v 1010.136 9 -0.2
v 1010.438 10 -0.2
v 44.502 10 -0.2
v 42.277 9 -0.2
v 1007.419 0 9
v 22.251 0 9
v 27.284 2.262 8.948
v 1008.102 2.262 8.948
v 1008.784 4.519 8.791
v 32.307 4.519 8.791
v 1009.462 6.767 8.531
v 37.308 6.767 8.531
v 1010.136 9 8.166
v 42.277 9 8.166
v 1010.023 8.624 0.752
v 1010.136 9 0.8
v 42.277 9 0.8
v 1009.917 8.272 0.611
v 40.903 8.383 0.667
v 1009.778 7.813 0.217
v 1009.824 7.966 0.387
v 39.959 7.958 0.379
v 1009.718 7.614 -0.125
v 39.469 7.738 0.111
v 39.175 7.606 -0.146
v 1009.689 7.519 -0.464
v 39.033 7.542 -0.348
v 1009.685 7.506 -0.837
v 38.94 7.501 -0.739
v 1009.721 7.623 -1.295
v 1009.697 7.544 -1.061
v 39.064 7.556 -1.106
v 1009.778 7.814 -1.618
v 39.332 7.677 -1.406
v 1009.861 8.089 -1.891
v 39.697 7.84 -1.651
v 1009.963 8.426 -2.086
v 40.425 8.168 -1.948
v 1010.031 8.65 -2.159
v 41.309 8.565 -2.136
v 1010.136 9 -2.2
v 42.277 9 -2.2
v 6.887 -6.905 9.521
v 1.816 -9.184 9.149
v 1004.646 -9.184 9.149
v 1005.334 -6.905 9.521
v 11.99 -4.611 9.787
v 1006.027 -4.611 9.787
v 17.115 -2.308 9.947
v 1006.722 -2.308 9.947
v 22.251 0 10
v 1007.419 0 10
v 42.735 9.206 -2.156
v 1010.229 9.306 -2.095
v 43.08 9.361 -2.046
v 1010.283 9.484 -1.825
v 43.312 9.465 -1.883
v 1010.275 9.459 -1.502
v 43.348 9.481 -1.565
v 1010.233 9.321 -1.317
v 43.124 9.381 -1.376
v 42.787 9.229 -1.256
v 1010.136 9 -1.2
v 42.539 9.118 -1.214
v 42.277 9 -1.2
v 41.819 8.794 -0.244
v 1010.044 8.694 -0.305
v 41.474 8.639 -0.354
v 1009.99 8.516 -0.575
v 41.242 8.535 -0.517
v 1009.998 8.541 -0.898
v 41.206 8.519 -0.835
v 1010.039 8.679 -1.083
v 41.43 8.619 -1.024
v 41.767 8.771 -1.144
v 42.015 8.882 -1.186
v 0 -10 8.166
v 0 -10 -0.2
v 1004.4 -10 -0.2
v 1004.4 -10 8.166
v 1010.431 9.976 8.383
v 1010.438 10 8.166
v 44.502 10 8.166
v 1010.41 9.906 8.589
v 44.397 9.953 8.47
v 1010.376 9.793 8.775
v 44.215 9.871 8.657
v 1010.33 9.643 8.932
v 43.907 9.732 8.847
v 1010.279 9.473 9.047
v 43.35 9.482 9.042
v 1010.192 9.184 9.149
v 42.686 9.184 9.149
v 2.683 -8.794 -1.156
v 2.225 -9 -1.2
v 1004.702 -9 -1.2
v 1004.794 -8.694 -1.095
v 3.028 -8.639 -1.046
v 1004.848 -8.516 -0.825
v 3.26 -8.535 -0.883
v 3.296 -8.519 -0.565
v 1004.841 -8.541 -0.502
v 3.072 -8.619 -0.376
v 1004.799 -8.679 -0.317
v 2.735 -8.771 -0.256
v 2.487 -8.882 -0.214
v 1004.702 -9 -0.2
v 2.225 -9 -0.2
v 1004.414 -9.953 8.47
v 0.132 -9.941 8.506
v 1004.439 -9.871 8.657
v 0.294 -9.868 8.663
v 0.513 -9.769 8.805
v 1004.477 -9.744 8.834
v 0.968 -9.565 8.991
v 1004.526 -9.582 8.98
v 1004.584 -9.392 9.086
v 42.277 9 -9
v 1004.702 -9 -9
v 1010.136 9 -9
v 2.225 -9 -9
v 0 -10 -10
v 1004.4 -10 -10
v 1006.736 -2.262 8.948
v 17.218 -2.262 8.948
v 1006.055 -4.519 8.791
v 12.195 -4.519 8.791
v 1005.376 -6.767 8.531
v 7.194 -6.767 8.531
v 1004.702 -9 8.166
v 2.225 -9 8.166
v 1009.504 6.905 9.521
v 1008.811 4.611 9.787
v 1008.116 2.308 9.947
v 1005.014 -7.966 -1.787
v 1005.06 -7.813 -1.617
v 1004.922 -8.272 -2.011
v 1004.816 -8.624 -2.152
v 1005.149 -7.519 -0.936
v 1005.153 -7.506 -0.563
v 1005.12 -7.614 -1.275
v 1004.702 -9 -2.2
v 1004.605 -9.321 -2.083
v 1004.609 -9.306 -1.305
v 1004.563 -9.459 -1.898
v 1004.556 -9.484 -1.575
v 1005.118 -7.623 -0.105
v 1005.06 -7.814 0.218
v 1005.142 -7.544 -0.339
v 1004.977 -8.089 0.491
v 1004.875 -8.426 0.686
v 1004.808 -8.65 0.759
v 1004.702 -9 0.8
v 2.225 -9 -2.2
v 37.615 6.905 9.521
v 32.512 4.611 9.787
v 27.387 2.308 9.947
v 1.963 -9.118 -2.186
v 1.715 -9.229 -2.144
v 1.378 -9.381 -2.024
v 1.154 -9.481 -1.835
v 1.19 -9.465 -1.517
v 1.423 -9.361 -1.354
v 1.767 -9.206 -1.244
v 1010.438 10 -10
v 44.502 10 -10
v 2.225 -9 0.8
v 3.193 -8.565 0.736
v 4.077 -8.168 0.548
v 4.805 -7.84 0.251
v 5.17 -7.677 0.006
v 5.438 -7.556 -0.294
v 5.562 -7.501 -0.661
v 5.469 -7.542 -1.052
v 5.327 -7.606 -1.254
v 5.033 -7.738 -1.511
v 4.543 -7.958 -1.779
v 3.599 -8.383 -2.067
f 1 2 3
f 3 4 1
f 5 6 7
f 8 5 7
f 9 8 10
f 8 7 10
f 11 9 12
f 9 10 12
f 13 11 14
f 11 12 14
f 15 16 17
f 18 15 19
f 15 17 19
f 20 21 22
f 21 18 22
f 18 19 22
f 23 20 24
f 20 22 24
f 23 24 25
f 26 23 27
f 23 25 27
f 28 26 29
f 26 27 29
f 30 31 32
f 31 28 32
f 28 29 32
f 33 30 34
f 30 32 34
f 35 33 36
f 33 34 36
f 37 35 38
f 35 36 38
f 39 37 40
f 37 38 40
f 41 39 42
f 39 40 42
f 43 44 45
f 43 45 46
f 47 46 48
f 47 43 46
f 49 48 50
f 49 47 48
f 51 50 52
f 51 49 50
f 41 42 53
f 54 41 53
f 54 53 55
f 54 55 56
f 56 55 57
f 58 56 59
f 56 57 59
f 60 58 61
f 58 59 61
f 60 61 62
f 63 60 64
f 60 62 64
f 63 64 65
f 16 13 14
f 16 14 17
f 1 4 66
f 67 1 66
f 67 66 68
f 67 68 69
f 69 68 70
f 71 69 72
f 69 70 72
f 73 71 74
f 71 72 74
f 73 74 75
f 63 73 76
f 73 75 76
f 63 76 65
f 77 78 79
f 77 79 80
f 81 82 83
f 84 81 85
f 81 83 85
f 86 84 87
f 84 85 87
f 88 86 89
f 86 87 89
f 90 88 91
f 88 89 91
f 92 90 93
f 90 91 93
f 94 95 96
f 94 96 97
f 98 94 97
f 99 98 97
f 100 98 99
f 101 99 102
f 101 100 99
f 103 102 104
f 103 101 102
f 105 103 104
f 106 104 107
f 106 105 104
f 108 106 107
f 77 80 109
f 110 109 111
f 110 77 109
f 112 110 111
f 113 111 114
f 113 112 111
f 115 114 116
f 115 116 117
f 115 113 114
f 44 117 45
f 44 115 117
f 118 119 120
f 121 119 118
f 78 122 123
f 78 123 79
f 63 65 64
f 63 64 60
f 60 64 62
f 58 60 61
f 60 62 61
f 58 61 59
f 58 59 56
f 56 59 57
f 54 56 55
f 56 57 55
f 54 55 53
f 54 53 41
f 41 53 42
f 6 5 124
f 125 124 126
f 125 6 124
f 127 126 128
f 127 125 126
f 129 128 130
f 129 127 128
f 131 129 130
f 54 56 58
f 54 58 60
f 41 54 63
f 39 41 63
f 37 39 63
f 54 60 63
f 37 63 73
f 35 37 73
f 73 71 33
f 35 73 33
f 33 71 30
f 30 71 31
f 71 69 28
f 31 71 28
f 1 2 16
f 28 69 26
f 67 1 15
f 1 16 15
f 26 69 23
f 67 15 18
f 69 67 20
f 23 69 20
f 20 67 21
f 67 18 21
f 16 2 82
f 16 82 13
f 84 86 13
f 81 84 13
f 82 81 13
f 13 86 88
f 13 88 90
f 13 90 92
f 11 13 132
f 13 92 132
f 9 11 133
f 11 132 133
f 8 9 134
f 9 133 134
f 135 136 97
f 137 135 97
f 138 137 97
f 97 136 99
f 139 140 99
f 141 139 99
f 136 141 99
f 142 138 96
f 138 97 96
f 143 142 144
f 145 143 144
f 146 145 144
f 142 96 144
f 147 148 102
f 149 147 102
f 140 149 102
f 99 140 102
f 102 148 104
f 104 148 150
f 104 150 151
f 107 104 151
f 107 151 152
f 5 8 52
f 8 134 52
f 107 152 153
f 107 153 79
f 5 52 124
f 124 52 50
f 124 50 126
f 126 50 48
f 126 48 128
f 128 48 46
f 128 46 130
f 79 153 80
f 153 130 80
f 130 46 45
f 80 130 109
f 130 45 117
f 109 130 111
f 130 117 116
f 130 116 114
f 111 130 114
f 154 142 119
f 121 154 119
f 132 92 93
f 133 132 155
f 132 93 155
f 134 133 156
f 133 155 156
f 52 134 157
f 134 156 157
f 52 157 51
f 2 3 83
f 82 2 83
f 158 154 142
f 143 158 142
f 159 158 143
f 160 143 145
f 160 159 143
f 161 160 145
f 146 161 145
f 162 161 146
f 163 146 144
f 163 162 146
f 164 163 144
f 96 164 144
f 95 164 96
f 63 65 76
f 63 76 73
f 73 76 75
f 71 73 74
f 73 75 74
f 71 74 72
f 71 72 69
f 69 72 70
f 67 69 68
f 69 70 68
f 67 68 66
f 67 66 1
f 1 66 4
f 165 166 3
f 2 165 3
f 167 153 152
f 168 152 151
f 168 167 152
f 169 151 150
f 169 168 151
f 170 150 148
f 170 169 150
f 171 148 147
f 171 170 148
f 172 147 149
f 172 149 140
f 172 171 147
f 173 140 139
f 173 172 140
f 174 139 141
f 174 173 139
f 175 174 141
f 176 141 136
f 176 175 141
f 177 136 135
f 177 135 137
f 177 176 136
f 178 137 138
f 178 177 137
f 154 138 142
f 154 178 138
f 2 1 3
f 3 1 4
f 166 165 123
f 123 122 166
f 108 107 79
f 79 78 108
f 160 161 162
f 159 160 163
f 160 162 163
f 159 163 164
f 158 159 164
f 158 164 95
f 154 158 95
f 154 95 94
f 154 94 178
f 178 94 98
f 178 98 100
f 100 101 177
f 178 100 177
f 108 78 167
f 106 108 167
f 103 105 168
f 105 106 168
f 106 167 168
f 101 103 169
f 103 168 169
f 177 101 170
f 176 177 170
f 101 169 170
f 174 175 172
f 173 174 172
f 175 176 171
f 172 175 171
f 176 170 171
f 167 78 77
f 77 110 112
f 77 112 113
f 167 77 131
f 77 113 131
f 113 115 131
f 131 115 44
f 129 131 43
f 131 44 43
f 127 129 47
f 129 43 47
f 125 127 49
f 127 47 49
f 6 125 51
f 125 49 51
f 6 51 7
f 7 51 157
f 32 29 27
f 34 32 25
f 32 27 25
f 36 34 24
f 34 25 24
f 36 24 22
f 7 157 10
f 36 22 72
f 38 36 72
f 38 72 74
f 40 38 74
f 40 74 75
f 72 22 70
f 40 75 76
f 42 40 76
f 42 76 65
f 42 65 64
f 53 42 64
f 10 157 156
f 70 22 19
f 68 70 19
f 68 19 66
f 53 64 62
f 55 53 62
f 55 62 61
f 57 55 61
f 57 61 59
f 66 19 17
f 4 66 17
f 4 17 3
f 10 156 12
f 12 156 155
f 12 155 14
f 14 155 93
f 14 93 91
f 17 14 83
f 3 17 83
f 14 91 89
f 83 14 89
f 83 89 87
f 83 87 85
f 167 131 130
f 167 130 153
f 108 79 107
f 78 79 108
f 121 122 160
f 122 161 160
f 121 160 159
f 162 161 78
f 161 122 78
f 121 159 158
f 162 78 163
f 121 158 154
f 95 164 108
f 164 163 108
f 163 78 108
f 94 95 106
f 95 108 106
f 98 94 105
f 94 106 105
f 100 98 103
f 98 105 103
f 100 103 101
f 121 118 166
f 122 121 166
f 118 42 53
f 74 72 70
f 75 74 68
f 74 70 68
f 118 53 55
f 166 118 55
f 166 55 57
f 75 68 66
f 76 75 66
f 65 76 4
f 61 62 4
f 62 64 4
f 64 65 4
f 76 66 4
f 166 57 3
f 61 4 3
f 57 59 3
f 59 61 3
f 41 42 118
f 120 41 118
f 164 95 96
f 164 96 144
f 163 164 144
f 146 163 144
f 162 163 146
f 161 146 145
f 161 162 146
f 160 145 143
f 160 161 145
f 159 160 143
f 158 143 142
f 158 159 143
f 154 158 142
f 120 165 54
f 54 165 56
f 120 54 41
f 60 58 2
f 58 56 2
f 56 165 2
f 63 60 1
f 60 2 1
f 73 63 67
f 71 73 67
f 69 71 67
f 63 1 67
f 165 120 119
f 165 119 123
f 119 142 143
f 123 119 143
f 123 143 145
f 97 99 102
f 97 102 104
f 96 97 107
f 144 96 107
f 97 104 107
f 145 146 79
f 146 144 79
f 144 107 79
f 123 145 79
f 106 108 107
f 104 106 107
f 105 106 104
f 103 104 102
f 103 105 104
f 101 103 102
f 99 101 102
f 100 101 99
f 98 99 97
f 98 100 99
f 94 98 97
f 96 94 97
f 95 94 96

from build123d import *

# Parameters (mm, degrees)
F2_DEPTH      = 1200
F4_DEPTH      = 1200
F8_DEPTH      = 10.001
F8_DEPTH_BACK = 10.001


with BuildPart() as f2:
    # F1 (on Right) → F2 (new body)
    with BuildSketch(Plane.YZ):
        with BuildLine():
            Line((0, -9), (0, -10))
            Line((0, -10), (10, -10))
            Line((10, -10), (10, -0.2))
            Line((10, -0.2), (9, -0.2))
            ThreePointArc((9, -0.2), (8.5, -0.7), (9, -1.2))
            ThreePointArc((9, -1.2), (9.5, -1.7), (9, -2.2))
            Line((9, -2.2), (9, -9))
            Line((9, -9), (0, -9))
        make_face()
    extrude(amount=F2_DEPTH)

    # F5: F2 across plane


with BuildPart() as f4:
    # F3 (on Right) → F4 (new body)
    with BuildSketch(Plane.YZ):
        with BuildLine():
            Line((9, -0.2), (10, -0.2))
            Line((10, -0.2), (10, 8.1663783152))
            ThreePointArc((10, 8.1663783152), (9.7693092582, 8.8052548802), (9.1836734694, 9.1493656277))
            ThreePointArc((9.1836734694, 9.1493656277), (4.6114920912, 9.7868872364), (0, 10))
            Line((0, 10), (0, 9))
            ThreePointArc((0, 9), (4.5192622493, 8.7911494917), (9, 8.1663783152))
            Line((9, 8.1663783152), (9, 0.8))
            ThreePointArc((9, 0.8), (7.5, -0.7), (9, -2.2))
            ThreePointArc((9, -2.2), (9.5, -1.7), (9, -1.2))
            ThreePointArc((9, -1.2), (8.5, -0.7), (9, -0.2))
        make_face()
    extrude(amount=F4_DEPTH)

    # F6: F4 across plane


with BuildPart() as f2_1:
    add(f2.part)
    add(f2.part.mirror(Plane.XZ))


with BuildPart() as f4_1:
    add(f4.part)
    add(f4.part.mirror(Plane.XZ))


with BuildPart() as f8_tool:
    # F7 (on Top) → F8 (new body, two sides)
    with BuildSketch(Plane.XY) as f8_sk:
        Polygon((0, 10), (0, 0), (0, -10), (44.5020182264, 10), align=None)
        Polygon((1010.4383560074, 10), (1004.4, -10), (1208.0904245377, -10), (1208.0904245377, 10), align=None)
    extrude(amount=F8_DEPTH)
    extrude(f8_sk.sketch, amount=-F8_DEPTH_BACK)


with BuildPart() as f2_2:
    add(f2_1.part)

    # F8: cut by f8_tool
    add(f8_tool.part, mode=Mode.SUBTRACT)


with BuildPart() as f4_2:
    add(f4_1.part)

    # F8: cut by f8_tool
    add(f8_tool.part, mode=Mode.SUBTRACT)


solid = Compound([f2_2.part, f4_2.part])
